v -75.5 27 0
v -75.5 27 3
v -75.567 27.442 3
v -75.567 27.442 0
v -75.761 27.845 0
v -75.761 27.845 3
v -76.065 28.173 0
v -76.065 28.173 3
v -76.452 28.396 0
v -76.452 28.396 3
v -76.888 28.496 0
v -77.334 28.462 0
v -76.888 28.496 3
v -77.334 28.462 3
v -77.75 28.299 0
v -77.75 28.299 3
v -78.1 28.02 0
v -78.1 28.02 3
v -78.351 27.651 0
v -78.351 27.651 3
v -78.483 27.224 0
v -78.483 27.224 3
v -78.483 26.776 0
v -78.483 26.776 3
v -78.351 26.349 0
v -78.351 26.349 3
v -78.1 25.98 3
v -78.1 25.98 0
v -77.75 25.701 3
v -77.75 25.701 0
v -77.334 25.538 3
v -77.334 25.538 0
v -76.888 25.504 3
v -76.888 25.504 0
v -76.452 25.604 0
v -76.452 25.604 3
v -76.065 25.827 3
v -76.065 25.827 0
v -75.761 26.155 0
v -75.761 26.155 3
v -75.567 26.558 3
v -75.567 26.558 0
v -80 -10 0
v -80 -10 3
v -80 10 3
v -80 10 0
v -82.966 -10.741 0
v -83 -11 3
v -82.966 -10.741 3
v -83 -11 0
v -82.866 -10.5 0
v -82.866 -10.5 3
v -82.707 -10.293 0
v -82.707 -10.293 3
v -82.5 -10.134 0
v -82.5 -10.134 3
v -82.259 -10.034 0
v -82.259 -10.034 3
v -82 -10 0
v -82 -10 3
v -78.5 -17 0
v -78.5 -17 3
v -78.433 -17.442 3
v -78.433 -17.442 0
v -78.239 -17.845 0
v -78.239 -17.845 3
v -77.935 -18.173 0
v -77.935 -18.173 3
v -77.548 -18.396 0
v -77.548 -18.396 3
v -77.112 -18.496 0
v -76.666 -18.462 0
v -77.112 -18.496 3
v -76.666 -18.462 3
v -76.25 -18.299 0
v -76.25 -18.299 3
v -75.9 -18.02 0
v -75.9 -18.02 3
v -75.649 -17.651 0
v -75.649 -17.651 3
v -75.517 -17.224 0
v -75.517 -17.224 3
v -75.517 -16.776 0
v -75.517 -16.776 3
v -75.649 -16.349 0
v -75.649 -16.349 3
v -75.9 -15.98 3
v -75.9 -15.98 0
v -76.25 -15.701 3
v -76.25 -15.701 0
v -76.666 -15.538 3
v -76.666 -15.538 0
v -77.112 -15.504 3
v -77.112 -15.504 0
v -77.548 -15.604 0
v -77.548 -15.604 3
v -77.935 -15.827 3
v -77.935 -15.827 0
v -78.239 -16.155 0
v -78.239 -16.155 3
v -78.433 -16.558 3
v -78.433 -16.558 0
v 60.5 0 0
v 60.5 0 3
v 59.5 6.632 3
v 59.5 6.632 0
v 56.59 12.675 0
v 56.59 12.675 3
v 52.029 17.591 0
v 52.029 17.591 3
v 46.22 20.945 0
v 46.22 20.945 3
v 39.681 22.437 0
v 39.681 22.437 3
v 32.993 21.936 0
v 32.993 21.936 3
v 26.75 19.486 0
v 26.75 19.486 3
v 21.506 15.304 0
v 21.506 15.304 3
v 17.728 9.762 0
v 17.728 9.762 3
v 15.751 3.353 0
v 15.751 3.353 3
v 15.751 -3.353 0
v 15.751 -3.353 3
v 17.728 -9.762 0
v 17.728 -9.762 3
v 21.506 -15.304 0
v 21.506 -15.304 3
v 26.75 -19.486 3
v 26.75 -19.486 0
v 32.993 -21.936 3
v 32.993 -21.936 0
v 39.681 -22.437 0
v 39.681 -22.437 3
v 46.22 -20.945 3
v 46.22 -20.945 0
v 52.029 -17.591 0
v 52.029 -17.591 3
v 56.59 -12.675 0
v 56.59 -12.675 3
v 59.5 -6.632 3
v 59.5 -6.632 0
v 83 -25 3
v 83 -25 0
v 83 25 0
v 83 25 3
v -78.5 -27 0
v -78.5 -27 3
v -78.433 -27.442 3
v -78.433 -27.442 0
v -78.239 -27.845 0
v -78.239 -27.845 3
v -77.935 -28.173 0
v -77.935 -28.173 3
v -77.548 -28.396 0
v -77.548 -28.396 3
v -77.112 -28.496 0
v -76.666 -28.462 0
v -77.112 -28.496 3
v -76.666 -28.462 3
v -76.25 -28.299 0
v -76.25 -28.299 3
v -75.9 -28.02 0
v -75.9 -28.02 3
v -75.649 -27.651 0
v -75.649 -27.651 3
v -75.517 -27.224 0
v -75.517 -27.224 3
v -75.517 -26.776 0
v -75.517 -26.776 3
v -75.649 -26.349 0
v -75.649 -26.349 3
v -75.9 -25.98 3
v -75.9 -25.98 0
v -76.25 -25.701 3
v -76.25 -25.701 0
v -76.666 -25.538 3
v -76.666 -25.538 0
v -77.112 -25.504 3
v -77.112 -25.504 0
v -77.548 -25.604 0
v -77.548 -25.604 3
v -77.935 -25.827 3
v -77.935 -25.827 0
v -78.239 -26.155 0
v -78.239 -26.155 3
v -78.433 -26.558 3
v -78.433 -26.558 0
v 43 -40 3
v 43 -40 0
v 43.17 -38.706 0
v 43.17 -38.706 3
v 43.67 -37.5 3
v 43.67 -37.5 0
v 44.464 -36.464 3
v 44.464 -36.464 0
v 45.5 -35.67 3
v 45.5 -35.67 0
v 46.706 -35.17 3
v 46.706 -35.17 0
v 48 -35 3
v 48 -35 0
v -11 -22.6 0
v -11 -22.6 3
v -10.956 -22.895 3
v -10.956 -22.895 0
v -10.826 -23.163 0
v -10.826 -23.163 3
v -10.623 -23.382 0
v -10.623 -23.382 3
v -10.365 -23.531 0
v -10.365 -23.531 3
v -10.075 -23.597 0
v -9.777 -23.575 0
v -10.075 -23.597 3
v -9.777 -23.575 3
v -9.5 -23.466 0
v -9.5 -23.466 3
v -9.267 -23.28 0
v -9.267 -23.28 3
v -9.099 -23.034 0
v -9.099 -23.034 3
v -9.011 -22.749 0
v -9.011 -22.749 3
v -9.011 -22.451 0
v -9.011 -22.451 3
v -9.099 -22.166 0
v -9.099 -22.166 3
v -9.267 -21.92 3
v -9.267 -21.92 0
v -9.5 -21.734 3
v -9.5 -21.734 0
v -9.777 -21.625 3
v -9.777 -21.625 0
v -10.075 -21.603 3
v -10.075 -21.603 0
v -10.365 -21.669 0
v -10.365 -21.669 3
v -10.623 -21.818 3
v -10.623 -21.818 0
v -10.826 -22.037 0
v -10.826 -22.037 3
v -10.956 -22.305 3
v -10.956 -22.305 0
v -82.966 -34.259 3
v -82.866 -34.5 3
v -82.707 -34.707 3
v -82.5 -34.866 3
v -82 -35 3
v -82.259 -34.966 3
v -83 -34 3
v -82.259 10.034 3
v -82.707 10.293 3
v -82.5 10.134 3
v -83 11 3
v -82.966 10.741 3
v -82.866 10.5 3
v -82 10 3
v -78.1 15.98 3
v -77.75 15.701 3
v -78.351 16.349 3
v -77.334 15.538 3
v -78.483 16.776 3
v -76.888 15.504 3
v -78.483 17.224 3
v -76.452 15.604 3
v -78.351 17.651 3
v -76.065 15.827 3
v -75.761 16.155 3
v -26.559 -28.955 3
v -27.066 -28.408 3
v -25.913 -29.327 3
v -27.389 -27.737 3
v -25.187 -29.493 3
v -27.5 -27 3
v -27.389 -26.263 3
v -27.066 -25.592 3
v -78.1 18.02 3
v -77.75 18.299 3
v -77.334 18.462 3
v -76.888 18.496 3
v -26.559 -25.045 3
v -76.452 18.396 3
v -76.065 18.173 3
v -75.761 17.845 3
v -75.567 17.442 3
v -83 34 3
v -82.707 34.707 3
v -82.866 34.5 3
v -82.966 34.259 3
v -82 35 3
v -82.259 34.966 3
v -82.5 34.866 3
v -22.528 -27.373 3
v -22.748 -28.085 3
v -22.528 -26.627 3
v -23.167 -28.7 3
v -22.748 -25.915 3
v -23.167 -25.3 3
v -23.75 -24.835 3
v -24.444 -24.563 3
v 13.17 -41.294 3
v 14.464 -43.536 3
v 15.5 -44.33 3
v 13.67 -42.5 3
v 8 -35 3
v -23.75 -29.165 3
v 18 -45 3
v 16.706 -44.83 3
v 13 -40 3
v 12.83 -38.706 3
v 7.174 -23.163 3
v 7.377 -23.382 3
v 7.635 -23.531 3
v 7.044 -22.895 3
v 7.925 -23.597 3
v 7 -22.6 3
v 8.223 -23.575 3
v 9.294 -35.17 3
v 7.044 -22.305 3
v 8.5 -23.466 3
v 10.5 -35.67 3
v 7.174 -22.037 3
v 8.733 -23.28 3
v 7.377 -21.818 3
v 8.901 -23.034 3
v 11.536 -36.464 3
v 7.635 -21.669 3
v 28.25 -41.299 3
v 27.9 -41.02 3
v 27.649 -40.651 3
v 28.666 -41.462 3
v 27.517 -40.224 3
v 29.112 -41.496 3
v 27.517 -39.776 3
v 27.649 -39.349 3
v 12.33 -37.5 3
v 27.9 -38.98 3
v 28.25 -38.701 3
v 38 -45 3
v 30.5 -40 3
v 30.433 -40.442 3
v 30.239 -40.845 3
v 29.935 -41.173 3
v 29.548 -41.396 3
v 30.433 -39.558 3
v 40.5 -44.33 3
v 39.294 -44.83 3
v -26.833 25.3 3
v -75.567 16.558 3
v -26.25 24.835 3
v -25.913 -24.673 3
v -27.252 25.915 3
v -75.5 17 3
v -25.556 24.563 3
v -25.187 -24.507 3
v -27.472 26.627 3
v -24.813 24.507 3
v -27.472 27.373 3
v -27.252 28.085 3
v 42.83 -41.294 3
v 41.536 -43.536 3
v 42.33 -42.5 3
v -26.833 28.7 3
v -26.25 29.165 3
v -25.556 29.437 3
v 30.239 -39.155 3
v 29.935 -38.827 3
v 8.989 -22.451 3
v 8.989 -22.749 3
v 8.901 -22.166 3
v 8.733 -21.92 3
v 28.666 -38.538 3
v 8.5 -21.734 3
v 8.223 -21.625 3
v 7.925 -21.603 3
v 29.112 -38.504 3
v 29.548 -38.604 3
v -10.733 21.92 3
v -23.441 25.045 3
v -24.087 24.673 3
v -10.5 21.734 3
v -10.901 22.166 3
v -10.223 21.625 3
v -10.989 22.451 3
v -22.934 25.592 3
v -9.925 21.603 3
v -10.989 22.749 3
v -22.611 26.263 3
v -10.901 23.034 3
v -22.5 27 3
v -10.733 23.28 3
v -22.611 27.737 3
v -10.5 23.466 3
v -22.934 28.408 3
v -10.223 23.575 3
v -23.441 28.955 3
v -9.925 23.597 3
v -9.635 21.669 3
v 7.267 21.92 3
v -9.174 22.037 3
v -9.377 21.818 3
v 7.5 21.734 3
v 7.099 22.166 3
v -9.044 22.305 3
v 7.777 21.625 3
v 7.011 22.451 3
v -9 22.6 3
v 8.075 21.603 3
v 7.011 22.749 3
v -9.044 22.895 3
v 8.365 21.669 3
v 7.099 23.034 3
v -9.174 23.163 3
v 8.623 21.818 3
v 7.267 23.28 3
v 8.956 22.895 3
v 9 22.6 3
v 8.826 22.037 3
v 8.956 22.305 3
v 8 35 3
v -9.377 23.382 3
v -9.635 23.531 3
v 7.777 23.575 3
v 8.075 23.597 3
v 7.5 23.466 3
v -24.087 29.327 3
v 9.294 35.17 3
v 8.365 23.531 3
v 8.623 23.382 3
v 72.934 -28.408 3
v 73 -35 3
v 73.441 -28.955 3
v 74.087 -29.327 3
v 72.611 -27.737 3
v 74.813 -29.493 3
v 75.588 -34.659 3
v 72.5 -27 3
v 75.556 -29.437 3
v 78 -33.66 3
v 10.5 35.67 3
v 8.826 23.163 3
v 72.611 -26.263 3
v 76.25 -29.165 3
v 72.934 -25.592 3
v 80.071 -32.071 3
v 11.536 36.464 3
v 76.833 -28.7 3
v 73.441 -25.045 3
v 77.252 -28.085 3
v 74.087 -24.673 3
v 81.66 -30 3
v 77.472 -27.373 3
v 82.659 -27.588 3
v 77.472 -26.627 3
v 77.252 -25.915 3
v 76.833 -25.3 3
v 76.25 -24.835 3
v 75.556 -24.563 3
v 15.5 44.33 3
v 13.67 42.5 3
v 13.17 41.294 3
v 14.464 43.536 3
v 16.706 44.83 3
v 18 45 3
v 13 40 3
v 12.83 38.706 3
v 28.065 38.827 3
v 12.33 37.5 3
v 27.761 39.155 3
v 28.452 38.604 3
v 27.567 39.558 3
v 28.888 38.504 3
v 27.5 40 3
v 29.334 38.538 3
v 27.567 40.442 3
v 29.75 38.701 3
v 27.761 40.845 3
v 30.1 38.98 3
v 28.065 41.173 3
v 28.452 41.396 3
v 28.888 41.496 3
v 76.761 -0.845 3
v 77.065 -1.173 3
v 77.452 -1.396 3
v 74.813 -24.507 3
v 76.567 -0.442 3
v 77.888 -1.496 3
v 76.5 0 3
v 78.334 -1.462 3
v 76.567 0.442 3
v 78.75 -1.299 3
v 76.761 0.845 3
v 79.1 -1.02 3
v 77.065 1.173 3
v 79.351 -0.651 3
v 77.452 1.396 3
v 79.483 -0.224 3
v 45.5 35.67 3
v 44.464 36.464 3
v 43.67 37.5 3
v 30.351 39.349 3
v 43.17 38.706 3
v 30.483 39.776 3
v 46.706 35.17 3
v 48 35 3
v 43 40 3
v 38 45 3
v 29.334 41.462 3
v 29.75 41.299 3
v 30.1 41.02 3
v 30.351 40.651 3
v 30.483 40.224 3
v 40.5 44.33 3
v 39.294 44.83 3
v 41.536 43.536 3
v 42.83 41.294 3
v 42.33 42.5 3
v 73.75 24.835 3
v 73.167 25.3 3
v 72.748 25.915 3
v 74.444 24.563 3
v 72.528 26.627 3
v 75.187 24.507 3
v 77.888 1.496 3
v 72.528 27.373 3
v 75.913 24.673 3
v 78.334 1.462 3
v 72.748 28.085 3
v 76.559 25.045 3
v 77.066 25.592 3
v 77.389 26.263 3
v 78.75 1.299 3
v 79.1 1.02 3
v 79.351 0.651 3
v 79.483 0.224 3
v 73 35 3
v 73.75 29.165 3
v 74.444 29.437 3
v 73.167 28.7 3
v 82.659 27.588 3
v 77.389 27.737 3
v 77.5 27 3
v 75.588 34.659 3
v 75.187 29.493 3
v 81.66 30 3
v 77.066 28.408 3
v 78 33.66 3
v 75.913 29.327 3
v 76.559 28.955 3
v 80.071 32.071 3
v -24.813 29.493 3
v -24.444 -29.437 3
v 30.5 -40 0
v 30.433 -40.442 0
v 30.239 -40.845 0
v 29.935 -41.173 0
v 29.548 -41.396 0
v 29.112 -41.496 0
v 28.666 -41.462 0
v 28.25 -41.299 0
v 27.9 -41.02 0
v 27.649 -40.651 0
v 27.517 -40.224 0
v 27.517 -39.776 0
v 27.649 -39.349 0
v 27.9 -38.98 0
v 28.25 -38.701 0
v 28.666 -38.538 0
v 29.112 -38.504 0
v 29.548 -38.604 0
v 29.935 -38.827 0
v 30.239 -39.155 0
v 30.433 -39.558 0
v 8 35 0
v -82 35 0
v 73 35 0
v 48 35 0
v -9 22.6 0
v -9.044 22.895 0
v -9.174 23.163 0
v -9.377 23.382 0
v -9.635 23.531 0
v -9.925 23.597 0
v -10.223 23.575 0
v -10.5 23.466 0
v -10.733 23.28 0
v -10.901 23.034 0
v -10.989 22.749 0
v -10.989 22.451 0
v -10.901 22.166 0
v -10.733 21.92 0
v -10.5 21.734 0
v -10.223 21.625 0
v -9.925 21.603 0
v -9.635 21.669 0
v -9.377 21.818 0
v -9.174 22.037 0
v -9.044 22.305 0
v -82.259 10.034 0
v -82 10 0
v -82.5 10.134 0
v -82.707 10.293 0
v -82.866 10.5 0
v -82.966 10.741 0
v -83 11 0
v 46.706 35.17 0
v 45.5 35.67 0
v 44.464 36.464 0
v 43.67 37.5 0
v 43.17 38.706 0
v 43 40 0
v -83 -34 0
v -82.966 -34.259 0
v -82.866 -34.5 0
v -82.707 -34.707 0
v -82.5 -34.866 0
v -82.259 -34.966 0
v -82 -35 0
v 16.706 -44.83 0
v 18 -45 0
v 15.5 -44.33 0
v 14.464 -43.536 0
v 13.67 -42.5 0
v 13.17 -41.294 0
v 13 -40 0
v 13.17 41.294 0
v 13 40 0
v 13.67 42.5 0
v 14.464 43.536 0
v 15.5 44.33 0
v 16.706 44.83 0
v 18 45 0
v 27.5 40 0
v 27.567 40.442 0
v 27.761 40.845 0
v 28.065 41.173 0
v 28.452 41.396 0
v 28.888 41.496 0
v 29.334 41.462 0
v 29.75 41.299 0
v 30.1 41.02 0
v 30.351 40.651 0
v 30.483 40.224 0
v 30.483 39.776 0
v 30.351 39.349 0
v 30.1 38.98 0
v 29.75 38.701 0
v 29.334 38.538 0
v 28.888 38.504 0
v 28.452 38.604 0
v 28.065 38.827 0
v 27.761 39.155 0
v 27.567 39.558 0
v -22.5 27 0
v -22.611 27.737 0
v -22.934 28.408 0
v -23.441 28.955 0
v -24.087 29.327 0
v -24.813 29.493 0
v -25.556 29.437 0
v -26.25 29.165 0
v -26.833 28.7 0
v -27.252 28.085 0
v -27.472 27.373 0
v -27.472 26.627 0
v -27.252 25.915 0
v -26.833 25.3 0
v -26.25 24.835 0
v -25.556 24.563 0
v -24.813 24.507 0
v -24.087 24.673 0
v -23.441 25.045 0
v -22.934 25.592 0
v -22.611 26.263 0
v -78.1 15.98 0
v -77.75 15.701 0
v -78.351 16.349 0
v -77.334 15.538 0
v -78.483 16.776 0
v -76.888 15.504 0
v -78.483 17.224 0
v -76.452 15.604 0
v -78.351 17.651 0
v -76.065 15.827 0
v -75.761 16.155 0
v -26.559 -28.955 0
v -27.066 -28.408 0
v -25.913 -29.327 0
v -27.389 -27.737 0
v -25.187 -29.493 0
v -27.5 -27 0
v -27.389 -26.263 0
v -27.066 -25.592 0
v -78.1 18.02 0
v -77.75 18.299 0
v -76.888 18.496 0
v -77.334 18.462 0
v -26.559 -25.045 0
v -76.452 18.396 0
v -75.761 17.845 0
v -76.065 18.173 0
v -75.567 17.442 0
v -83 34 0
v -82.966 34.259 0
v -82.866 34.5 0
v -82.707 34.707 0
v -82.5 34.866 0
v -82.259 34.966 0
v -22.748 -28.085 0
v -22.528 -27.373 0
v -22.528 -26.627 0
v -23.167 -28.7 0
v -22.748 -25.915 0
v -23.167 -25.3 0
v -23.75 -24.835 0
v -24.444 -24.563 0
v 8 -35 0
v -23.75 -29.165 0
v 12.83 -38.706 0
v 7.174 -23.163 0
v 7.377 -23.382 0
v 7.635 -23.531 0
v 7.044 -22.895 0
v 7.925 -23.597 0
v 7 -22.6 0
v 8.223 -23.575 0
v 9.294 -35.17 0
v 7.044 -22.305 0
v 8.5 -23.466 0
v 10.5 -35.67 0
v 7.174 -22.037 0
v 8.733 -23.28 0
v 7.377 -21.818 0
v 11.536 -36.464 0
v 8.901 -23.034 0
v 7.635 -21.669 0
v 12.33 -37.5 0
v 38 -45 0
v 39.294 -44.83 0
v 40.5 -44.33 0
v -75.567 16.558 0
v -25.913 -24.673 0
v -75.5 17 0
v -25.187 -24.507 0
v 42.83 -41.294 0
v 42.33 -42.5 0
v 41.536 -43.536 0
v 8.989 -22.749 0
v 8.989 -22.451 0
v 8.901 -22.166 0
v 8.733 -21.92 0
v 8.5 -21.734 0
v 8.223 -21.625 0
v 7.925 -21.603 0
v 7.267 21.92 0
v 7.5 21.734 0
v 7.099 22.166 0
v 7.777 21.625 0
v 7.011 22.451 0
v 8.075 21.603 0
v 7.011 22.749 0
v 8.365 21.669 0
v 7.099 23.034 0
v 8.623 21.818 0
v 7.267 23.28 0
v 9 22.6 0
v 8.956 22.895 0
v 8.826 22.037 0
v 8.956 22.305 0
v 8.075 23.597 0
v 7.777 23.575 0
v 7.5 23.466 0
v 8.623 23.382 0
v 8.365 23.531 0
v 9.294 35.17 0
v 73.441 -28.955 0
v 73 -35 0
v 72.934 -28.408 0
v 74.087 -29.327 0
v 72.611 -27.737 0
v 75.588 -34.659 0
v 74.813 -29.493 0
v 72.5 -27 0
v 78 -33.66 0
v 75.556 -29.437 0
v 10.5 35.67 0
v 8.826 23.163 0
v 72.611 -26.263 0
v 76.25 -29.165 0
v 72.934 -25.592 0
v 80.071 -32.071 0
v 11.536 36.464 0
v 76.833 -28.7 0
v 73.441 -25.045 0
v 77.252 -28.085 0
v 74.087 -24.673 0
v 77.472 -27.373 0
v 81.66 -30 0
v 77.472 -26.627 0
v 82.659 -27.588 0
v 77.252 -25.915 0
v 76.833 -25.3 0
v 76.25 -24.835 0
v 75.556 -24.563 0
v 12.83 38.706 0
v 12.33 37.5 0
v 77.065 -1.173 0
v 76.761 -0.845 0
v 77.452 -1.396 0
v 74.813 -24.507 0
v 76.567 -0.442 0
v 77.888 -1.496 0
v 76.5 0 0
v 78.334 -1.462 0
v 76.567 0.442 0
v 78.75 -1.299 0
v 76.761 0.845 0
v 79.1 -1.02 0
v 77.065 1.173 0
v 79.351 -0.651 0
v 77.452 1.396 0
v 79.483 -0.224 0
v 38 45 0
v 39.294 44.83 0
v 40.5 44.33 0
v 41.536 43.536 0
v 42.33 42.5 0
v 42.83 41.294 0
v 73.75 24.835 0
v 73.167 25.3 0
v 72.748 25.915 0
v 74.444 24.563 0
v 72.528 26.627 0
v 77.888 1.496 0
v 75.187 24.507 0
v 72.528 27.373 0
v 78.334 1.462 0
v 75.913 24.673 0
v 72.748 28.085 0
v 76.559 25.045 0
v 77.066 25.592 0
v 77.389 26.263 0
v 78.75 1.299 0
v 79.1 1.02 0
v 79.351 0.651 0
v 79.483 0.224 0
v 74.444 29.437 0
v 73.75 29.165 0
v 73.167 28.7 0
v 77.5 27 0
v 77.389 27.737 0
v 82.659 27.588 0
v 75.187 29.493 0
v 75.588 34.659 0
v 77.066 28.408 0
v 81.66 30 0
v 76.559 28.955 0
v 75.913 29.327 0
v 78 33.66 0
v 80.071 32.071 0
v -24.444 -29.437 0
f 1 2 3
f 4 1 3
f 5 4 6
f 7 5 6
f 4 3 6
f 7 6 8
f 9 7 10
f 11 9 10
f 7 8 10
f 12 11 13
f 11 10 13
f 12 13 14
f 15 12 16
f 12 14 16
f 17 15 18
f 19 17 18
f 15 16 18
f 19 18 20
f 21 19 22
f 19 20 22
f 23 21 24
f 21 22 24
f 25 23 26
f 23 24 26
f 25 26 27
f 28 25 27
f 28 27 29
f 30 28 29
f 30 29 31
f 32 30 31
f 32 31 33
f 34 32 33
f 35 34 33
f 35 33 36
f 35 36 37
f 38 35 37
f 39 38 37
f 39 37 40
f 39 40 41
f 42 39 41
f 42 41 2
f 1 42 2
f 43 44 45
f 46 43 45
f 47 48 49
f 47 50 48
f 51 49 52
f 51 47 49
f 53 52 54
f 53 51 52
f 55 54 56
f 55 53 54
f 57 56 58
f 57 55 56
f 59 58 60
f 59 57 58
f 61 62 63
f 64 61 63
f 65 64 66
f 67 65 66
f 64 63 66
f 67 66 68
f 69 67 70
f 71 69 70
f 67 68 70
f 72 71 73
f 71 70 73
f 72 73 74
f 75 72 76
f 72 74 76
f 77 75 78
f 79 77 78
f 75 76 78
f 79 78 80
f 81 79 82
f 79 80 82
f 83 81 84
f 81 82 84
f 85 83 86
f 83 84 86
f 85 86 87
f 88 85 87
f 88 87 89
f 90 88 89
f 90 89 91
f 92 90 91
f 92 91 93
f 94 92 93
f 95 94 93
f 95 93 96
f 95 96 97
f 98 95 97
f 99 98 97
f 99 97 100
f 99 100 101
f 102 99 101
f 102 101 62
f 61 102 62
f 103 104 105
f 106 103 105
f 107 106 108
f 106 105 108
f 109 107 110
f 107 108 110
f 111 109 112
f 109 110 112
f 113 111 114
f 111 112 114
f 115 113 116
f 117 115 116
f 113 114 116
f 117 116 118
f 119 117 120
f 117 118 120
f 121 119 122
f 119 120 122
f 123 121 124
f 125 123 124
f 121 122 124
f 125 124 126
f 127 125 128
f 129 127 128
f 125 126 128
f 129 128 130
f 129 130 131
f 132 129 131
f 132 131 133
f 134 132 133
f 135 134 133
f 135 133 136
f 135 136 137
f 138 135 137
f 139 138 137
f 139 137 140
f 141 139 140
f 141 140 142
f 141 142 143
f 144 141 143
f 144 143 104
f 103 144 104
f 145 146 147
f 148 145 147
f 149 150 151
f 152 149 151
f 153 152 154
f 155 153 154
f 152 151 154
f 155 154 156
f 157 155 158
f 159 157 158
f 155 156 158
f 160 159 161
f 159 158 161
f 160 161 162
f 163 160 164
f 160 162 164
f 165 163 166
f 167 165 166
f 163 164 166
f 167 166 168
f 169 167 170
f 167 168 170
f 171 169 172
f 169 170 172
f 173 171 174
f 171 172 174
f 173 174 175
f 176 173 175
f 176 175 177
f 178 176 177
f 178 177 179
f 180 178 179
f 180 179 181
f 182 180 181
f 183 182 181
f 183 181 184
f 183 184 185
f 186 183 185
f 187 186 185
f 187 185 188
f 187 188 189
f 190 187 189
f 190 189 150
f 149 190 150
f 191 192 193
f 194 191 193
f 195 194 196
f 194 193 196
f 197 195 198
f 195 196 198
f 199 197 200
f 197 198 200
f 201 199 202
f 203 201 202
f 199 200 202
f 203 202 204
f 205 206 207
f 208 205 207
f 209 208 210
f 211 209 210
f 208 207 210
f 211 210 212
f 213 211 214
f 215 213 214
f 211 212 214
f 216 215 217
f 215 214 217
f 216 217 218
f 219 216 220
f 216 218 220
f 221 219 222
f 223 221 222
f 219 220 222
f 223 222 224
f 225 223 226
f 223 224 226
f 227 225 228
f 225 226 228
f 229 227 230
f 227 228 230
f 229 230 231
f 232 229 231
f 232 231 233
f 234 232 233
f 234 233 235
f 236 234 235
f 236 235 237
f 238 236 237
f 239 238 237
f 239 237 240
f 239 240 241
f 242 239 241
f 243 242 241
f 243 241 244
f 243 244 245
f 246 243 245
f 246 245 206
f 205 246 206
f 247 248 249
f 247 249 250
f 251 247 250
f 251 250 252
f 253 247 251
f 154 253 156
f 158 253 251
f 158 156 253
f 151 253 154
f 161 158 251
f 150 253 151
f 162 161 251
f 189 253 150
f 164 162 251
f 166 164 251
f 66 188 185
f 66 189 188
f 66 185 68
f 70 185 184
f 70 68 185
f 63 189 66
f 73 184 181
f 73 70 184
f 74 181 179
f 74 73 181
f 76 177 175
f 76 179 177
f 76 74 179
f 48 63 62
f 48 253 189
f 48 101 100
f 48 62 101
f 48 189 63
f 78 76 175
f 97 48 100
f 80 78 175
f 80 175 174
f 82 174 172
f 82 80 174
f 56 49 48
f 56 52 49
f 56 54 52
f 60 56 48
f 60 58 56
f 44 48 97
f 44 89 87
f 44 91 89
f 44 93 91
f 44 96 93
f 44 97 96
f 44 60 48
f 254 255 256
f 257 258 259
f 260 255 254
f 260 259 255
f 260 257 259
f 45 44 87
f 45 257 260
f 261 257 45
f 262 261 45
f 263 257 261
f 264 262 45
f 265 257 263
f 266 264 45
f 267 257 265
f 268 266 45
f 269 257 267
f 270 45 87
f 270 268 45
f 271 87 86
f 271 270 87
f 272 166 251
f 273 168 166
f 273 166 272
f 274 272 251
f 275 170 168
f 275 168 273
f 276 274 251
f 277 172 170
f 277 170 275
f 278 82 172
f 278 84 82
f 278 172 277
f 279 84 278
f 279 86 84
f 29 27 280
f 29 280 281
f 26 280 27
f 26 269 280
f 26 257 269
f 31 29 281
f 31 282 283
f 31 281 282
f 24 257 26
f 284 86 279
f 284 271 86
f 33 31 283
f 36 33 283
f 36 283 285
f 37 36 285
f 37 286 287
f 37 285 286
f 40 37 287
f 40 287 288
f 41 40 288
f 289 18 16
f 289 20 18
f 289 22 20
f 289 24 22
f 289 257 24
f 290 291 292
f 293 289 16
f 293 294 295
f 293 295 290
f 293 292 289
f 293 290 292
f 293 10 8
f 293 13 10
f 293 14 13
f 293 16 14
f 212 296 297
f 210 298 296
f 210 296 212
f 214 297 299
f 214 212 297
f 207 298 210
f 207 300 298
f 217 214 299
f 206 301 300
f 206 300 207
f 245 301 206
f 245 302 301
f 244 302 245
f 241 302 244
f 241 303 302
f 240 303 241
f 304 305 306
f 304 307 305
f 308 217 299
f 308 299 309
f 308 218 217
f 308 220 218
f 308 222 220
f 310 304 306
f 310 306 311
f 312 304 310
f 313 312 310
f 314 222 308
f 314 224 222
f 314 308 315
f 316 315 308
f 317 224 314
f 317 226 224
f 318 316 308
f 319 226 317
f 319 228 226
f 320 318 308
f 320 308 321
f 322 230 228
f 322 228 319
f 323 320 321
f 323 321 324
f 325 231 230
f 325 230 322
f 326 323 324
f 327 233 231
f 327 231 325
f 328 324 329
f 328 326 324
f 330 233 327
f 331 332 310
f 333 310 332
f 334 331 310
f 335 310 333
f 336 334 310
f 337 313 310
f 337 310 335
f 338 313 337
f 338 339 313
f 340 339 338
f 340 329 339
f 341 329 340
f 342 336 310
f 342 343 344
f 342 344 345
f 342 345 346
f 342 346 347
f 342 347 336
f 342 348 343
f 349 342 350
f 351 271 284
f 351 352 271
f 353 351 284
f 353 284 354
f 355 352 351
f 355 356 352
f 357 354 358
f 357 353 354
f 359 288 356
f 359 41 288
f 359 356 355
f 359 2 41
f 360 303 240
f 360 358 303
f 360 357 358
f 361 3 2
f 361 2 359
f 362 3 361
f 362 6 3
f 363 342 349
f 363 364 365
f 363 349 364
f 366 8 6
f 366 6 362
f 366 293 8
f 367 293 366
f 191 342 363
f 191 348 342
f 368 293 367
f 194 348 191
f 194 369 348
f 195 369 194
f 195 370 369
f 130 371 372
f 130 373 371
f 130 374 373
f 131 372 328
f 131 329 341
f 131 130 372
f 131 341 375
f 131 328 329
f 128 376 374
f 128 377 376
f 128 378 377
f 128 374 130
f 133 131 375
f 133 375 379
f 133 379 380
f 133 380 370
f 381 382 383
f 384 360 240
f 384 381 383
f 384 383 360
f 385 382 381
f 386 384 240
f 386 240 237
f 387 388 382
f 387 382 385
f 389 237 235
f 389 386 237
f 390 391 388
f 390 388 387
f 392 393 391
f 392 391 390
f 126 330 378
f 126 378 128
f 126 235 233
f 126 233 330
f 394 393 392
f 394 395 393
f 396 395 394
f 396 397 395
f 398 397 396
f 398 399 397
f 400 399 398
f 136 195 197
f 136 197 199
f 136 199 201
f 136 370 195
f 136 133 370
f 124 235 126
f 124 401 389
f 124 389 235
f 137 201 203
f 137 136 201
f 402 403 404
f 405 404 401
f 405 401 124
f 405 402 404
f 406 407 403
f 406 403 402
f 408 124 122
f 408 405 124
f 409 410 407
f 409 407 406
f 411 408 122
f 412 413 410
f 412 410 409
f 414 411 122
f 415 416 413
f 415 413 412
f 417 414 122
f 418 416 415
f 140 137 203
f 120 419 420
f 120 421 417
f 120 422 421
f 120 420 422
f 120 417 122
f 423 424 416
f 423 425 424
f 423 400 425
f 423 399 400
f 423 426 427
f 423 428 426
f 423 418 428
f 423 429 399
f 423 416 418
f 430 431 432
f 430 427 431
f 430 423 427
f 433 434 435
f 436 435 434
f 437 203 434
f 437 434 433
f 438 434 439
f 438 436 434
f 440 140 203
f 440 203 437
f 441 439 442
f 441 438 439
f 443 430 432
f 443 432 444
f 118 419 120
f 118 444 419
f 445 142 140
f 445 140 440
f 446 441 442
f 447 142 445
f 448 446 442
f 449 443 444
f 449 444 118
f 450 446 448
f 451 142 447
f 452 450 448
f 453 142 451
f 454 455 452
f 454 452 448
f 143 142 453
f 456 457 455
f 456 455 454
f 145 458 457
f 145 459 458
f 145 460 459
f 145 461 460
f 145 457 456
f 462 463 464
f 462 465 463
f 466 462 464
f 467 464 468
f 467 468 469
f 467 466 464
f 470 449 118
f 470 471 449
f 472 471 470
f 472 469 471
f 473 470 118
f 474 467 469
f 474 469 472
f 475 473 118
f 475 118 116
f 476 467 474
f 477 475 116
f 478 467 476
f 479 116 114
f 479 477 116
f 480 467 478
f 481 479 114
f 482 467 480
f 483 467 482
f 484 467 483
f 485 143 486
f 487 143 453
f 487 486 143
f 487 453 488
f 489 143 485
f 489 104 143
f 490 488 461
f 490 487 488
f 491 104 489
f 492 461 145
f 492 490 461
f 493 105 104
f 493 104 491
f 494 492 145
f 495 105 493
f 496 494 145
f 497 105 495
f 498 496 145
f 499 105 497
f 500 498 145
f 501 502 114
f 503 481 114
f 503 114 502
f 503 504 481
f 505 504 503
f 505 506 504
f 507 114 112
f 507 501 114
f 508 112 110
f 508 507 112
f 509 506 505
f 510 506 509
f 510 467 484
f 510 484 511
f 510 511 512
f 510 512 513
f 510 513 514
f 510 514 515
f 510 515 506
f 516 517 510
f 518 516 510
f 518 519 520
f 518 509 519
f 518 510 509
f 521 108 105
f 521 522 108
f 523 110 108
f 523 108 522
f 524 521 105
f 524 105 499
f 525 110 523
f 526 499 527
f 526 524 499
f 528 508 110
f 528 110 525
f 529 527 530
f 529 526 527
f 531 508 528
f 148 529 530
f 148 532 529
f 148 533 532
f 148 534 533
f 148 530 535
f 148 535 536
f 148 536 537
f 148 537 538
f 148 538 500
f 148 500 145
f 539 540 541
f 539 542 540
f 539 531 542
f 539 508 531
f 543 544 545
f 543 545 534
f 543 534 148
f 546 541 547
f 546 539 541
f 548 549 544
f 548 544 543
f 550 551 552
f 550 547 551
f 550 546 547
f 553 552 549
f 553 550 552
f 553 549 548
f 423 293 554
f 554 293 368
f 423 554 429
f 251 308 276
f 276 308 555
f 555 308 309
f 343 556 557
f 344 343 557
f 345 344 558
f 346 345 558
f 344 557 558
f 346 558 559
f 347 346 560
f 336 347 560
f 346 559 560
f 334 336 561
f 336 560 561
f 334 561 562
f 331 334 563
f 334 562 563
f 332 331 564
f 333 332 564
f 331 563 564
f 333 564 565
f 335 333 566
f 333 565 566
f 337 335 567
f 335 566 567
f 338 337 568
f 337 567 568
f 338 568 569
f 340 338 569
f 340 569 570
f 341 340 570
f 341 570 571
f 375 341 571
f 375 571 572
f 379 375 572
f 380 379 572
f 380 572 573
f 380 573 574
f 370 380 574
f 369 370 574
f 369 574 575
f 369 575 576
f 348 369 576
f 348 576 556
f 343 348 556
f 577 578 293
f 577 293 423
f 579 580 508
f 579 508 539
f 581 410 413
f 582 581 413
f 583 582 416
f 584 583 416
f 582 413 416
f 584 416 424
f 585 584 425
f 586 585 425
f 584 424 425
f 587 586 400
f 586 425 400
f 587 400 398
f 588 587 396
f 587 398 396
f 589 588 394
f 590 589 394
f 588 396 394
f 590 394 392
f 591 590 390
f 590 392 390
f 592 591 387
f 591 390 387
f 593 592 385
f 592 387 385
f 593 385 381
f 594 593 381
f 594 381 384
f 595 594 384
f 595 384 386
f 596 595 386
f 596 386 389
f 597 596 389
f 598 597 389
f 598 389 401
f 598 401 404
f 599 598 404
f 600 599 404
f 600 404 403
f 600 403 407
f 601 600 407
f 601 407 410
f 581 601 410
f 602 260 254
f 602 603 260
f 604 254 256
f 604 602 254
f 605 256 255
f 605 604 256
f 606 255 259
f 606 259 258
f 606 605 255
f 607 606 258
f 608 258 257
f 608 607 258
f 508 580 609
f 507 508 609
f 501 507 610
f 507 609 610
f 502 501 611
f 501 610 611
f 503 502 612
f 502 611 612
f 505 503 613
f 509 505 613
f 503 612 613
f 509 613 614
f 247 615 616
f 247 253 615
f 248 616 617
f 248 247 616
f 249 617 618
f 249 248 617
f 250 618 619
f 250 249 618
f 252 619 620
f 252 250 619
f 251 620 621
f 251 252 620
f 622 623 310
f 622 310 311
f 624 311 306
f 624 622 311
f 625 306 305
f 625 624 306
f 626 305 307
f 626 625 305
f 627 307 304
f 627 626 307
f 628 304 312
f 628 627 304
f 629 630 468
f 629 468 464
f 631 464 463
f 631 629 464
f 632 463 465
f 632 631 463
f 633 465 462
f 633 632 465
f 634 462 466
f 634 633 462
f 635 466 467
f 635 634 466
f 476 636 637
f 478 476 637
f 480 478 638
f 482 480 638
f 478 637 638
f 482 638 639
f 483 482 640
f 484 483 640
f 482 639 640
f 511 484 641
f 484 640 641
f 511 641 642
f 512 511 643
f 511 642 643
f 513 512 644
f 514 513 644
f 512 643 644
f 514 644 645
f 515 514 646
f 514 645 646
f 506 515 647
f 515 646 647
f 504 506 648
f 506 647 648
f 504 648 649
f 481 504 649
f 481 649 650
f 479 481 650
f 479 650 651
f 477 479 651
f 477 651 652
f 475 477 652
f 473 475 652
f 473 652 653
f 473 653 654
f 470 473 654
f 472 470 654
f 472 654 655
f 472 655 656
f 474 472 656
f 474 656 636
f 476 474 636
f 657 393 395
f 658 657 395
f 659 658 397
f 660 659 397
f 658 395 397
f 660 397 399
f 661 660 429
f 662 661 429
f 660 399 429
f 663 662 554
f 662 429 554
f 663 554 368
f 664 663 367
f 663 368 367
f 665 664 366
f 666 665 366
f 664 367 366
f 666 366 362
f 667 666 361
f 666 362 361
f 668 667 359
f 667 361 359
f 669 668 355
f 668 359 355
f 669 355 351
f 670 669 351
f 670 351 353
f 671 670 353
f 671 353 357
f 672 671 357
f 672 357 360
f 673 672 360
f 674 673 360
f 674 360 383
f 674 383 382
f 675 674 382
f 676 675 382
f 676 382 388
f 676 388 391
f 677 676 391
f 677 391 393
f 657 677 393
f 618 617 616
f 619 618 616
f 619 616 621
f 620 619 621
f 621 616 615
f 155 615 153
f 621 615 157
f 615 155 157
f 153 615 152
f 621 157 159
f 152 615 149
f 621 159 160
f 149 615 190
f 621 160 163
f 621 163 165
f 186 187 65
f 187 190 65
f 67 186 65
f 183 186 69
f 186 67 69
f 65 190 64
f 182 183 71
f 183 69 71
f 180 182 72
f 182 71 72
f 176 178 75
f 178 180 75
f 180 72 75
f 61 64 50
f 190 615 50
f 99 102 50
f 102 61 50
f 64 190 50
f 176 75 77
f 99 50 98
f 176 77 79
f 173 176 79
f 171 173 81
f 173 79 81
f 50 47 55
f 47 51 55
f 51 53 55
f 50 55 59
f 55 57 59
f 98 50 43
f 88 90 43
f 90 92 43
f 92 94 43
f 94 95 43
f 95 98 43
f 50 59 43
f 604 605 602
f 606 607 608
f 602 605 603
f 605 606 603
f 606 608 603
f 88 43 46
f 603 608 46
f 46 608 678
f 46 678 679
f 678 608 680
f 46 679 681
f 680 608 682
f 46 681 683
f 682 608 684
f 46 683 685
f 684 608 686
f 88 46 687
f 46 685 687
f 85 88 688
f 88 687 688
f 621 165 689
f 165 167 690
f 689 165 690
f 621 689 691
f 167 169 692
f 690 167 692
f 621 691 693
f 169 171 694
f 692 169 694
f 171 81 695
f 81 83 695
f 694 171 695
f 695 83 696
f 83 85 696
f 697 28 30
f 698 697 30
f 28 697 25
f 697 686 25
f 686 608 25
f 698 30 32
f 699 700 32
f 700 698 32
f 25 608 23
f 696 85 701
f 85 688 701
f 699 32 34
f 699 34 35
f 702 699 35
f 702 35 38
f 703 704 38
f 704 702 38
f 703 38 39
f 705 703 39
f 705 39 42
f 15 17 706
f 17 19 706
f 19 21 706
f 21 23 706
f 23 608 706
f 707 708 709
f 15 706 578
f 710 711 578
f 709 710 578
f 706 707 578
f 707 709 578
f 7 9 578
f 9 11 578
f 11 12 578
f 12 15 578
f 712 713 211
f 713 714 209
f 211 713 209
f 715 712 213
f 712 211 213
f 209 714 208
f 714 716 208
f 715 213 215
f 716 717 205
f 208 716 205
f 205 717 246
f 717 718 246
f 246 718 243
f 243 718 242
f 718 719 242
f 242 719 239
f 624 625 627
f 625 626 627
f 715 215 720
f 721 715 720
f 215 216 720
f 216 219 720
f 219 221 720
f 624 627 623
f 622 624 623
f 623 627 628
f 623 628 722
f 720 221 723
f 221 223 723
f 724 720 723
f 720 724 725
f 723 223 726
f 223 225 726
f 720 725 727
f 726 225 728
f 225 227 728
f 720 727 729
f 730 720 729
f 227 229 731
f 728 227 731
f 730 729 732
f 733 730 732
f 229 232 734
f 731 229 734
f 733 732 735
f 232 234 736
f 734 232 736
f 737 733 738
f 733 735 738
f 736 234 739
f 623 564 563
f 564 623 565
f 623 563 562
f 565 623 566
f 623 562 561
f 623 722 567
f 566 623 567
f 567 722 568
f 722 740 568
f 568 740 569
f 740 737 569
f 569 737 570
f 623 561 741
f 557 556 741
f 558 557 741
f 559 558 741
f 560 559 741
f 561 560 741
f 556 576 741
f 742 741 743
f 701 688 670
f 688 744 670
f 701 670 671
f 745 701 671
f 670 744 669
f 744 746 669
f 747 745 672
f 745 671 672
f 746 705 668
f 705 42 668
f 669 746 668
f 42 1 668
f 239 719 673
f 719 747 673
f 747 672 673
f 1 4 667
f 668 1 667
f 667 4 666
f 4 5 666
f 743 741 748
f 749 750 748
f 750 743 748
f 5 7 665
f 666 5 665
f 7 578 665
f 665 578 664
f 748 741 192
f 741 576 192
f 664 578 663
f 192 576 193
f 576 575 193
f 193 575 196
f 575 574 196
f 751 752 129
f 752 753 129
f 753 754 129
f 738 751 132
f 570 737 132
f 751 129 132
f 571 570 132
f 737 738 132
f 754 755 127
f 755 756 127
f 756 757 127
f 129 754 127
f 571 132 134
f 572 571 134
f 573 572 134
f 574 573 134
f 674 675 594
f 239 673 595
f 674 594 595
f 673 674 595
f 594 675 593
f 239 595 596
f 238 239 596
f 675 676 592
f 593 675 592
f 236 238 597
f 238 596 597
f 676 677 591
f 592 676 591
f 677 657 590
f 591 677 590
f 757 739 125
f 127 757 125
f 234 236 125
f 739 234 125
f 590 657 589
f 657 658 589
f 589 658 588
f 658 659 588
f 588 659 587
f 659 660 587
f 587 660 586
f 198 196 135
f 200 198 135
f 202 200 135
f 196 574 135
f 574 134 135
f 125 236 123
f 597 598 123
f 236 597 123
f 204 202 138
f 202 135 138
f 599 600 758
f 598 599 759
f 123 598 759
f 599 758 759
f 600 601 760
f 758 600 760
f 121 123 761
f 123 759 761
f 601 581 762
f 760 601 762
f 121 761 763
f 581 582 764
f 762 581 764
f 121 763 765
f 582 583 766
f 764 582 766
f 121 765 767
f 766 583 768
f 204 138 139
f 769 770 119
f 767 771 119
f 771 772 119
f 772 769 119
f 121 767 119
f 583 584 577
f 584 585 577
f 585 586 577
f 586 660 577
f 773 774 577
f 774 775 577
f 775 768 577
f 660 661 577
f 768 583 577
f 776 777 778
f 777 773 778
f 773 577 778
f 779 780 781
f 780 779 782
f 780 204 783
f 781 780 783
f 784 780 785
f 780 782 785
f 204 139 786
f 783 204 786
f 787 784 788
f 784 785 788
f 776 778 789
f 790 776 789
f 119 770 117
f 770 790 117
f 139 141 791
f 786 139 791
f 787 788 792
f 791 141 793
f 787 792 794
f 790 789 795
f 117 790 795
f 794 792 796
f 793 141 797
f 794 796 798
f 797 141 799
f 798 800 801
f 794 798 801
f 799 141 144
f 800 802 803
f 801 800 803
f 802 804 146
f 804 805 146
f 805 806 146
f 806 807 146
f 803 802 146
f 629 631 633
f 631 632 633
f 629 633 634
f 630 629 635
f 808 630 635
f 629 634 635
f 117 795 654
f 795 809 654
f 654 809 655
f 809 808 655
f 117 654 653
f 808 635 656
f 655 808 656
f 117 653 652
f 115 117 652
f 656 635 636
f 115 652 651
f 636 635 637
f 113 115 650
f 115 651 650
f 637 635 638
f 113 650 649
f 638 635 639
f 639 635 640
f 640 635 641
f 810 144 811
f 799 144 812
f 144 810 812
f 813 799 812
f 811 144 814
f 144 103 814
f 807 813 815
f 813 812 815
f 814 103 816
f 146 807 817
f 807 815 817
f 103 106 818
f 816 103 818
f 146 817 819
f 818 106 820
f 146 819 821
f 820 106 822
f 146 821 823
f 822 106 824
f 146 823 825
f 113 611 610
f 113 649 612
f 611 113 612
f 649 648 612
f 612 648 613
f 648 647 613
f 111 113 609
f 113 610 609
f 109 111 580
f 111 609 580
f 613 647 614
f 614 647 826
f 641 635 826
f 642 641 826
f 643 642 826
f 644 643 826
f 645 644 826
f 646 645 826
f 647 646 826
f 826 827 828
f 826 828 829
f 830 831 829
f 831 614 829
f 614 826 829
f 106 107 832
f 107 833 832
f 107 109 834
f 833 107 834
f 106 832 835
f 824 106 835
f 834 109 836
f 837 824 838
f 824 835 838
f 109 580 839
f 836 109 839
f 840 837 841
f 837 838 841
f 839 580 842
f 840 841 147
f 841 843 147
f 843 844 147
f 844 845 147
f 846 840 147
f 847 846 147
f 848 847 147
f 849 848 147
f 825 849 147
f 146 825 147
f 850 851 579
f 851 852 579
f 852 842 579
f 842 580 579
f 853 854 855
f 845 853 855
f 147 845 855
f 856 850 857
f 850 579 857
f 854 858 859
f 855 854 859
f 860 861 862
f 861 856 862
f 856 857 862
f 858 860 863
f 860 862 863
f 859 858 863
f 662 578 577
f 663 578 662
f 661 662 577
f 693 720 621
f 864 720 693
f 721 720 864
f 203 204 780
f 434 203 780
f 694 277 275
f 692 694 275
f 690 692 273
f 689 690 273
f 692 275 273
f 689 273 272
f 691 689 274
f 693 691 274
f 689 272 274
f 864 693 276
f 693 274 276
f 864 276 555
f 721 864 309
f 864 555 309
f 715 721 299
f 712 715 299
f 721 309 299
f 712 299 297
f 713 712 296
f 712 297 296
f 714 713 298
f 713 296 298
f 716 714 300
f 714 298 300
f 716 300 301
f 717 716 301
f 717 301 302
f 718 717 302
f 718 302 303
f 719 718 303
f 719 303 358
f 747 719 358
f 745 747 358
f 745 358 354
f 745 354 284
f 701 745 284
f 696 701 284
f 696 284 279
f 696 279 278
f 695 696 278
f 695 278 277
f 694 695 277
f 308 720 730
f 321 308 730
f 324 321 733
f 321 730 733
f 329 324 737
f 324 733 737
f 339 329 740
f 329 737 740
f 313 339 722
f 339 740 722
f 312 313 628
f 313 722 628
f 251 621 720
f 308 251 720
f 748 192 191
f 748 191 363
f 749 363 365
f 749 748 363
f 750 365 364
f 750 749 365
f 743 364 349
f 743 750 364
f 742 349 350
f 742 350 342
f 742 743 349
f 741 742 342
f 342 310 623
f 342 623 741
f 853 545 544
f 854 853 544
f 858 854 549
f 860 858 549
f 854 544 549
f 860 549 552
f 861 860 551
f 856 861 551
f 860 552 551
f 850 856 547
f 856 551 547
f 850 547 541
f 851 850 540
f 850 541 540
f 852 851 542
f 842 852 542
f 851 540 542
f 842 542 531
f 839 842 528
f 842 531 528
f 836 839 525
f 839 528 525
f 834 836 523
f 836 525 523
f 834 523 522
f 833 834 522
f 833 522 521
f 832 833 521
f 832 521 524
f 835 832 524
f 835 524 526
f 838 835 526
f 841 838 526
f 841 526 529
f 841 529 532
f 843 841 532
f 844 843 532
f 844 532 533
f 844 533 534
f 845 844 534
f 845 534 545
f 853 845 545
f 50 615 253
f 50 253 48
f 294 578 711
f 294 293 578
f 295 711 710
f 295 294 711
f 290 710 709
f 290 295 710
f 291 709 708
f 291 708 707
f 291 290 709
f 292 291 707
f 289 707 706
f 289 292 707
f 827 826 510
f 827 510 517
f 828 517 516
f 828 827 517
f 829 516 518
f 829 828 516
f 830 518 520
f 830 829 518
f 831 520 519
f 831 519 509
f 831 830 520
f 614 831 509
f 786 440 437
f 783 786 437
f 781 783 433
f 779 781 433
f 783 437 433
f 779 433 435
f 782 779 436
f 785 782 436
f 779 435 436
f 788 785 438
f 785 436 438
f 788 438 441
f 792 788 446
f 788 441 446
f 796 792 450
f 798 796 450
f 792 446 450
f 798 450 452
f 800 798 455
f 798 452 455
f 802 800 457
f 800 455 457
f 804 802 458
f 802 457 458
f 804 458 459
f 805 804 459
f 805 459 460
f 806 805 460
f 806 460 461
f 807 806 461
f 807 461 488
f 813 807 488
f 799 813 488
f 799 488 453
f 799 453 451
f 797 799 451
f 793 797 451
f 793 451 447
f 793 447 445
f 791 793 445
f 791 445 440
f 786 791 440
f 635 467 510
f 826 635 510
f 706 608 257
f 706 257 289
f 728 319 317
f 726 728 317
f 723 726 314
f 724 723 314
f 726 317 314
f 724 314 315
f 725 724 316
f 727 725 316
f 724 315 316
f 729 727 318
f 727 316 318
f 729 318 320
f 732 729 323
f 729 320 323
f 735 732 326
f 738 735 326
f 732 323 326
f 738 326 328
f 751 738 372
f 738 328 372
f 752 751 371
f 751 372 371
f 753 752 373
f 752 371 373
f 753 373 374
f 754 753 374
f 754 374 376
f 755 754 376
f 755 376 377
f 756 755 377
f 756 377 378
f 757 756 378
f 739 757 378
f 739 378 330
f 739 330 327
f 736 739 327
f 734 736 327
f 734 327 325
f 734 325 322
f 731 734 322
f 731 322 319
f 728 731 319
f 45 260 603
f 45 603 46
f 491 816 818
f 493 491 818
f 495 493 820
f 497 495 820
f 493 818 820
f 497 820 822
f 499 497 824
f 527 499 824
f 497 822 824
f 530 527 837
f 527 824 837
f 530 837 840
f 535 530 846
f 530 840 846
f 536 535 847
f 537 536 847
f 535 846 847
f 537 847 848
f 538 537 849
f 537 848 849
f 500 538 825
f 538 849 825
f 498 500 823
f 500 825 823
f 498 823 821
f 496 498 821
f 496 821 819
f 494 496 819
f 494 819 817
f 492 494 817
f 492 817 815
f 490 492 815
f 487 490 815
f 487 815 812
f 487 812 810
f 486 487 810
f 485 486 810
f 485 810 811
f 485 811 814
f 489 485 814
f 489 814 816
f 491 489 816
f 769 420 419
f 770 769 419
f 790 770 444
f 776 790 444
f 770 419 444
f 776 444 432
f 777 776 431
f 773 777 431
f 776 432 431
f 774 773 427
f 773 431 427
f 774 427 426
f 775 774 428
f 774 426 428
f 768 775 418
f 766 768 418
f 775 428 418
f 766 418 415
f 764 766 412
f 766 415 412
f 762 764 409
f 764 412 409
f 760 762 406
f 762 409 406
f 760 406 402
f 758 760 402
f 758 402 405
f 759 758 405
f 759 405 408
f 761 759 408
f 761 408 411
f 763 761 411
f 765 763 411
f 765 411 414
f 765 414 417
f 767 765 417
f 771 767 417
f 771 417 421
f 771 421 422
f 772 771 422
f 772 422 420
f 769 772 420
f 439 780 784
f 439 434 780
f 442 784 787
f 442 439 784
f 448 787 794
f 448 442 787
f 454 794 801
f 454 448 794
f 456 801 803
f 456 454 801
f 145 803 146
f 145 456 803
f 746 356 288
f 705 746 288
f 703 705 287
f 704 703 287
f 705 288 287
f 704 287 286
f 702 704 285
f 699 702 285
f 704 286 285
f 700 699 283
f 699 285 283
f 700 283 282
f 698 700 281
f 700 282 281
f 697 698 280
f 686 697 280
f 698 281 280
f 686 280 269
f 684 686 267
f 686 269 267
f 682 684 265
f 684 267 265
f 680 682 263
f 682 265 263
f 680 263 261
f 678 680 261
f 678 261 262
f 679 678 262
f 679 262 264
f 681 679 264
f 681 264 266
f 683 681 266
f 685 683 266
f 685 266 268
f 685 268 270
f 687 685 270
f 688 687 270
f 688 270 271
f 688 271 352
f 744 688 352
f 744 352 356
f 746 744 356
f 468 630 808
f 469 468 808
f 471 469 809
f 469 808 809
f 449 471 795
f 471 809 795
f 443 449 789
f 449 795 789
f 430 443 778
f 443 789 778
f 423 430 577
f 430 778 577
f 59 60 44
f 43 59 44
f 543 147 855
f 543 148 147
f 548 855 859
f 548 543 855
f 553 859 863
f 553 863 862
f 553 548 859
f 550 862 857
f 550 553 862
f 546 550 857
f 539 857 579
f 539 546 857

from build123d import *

# Parameters (mm, degrees)
SKETCH_1_W          = 166
SKETCH_1_H          = 70
EXTRUDE_1_DEPTH     = 3
SKETCH_2_W          = 3
SKETCH_2_H          = 20
CUT_EXTRUDE_1_DEPTH = 91.1276872
SKETCH_3_R          = 1.5
CUT_EXTRUDE_2_DEPTH = 91.1276872
SKETCH_4_R          = 1
CUT_EXTRUDE_3_DEPTH = 91.1276872
FILLET_1_R          = 1
SKETCH_5_R          = 22.5
CUT_EXTRUDE_4_DEPTH = 91.1276872
SKETCH_6_R          = 2.5
CUT_EXTRUDE_5_DEPTH = 91.1276872
FILLET_2_R          = 10
SKETCH_7_W          = 30
SKETCH_7_H          = 10
EXTRUDE_2_DEPTH     = 3
FILLET_START        = -1
FILLET_3_DEPTH      = 5
FILLET_3_2_DEPTH    = 3
SKETCH_8_R          = 1.5
CUT_EXTRUDE_6_DEPTH = 95.461632423
SKETCH_9_R          = 1.5
CUT_EXTRUDE_7_DEPTH = 95.461632423


with BuildPart() as part:
    # 草图1 → 凸台-拉伸1 (new body)
    with BuildSketch(Plane.XY):
        Rectangle(SKETCH_1_W, SKETCH_1_H)
    extrude(amount=EXTRUDE_1_DEPTH)

    # 草图2 → 切除-拉伸1 (cut, through all)
    with BuildSketch(Plane.XY.offset(3)):
        with Locations((-81.5, 0)):
            Rectangle(SKETCH_2_W, SKETCH_2_H)
    extrude(amount=-CUT_EXTRUDE_1_DEPTH, mode=Mode.SUBTRACT)

    # 草图3 → 切除-拉伸2 (cut, through all)
    with BuildSketch(Plane.XY.offset(3)):
        with Locations((-77, 27)):
            Circle(SKETCH_3_R)
        with Locations((-77, 17)):
            Circle(SKETCH_3_R)
        with Locations(Location((-77, -17, 0), (0, 0, 180))):
            Circle(SKETCH_3_R)
        with Locations(Location((-77, -27, 0), (0, 0, 180))):
            Circle(SKETCH_3_R)
    extrude(amount=-CUT_EXTRUDE_2_DEPTH, mode=Mode.SUBTRACT)

    # 草图4 → 切除-拉伸3 (cut, through all)
    with BuildSketch(Plane.XY.offset(3)):
        with Locations((-10, 22.6)):
            Circle(SKETCH_4_R)
        with Locations((8, 22.6)):
            Circle(SKETCH_4_R)
        with Locations(Location((8, -22.6, 0), (0, 0, 180))):
            Circle(SKETCH_4_R)
        with Locations(Location((-10, -22.6, 0), (0, 0, 180))):
            Circle(SKETCH_4_R)
    extrude(amount=-CUT_EXTRUDE_3_DEPTH, mode=Mode.SUBTRACT)

    # 圆角1
    fillet_1_edges = [part.edges().sort_by_distance(p)[0] for p in [
        (-83, -10, 1.5),
        (-83, 10, 1.5),
        (-83, -35, 1.5),
        (-83, 35, 1.5),
    ]]
    fillet(fillet_1_edges, radius=FILLET_1_R)

    # 草图5 → 切除-拉伸4 (cut, through all)
    with BuildSketch(Plane.XY.offset(3)):
        with Locations((38, 0)):
            Circle(SKETCH_5_R)
    extrude(amount=-CUT_EXTRUDE_4_DEPTH, mode=Mode.SUBTRACT)

    # 草图6 → 切除-拉伸5 (cut, through all)
    with BuildSketch(Plane.XY.offset(3)):
        with Locations((75, 27)):
            Circle(SKETCH_6_R)
        with Locations((-25, 27)):
            Circle(SKETCH_6_R)
        with Locations(Location((75, -27, 0), (0, 0, 180))):
            Circle(SKETCH_6_R)
        with Locations(Location((-25, -27, 0), (0, 0, 180))):
            Circle(SKETCH_6_R)
    extrude(amount=-CUT_EXTRUDE_5_DEPTH, mode=Mode.SUBTRACT)

    # 圆角2
    fillet_2_edges = [part.edges().sort_by_distance(p)[0] for p in [
        (83, -35, 1.5),
        (83, 35, 1.5),
    ]]
    fillet(fillet_2_edges, radius=FILLET_2_R)

    # 草图7 → 凸台-拉伸2 (add)
    with BuildSketch(Plane.XY.offset(3)):
        with Locations((28, 40)):
            Rectangle(SKETCH_7_W, SKETCH_7_H)
        with Locations((28, -40)):
            Rectangle(SKETCH_7_W, SKETCH_7_H)
    extrude(amount=-EXTRUDE_2_DEPTH)

    # 圆角3: read off the stored shape, not the designer's step
    # 圆角3 outline → 圆角3 (cut)
    with BuildSketch(Plane.XY.offset(FILLET_START)):
        with BuildLine():
            Line((13, -45), (18, -45))
            ThreePointArc((18, -45), (14.464466094, -43.535533906), (13, -40))
            Line((13, -40), (13, -45))
        make_face()
        with BuildLine():
            ThreePointArc((43, -40), (41.535533906, -43.535533906), (38, -45))
            Line((38, -45), (43, -45))
            Line((43, -45), (43, -40))
        make_face()
        with BuildLine():
            Line((43, 45), (38, 45))
            ThreePointArc((38, 45), (41.535533906, 43.535533906), (43, 40))
            Line((43, 40), (43, 45))
        make_face()
        with BuildLine():
            ThreePointArc((13, 40), (14.464466094, 43.535533906), (18, 45))
            Line((18, 45), (13, 45))
            Line((13, 45), (13, 40))
        make_face()
    extrude(amount=FILLET_3_DEPTH, mode=Mode.SUBTRACT)

    # Fillet 3 2 outline → Fillet 3 2 (add)
    with BuildSketch(Plane.XY):
        with BuildLine():
            Line((43, -35), (43, -40))
            ThreePointArc((43, -40), (44.464466094, -36.464466094), (48, -35))
            Line((48, -35), (43, -35))
        make_face()
        with BuildLine():
            ThreePointArc((8, -35), (11.535533906, -36.464466094), (13, -40))
            Line((13, -40), (13, -35))
            Line((13, -35), (8, -35))
        make_face()
        with BuildLine():
            Line((13, 35), (13, 40))
            ThreePointArc((13, 40), (11.535533906, 36.464466094), (8, 35))
            Line((8, 35), (13, 35))
        make_face()
        with BuildLine():
            ThreePointArc((48, 35), (44.464466094, 36.464466094), (43, 40))
            Line((43, 40), (43, 35))
            Line((43, 35), (48, 35))
        make_face()
    extrude(amount=FILLET_3_2_DEPTH)

    # 草图8 → 切除-拉伸6 (cut, through all)
    with BuildSketch(Plane(origin=(0, 0, 0), x_dir=(-1, 0, 0), z_dir=(0, 0, -1))):
        with Locations((-78, 0)):
            Circle(SKETCH_8_R)
    extrude(amount=-CUT_EXTRUDE_6_DEPTH, mode=Mode.SUBTRACT)

    # 草图9 → 切除-拉伸7 (cut, through all)
    with BuildSketch(Plane(origin=(0, 0, 0), x_dir=(-1, 0, 0), z_dir=(0, 0, -1))):
        with Locations((-29, 40)):
            Circle(SKETCH_9_R)
        with Locations(Location((-29, -40, 0), (0, 0, 180))):
            Circle(SKETCH_9_R)
    extrude(amount=-CUT_EXTRUDE_7_DEPTH, mode=Mode.SUBTRACT)


solid = part.part
